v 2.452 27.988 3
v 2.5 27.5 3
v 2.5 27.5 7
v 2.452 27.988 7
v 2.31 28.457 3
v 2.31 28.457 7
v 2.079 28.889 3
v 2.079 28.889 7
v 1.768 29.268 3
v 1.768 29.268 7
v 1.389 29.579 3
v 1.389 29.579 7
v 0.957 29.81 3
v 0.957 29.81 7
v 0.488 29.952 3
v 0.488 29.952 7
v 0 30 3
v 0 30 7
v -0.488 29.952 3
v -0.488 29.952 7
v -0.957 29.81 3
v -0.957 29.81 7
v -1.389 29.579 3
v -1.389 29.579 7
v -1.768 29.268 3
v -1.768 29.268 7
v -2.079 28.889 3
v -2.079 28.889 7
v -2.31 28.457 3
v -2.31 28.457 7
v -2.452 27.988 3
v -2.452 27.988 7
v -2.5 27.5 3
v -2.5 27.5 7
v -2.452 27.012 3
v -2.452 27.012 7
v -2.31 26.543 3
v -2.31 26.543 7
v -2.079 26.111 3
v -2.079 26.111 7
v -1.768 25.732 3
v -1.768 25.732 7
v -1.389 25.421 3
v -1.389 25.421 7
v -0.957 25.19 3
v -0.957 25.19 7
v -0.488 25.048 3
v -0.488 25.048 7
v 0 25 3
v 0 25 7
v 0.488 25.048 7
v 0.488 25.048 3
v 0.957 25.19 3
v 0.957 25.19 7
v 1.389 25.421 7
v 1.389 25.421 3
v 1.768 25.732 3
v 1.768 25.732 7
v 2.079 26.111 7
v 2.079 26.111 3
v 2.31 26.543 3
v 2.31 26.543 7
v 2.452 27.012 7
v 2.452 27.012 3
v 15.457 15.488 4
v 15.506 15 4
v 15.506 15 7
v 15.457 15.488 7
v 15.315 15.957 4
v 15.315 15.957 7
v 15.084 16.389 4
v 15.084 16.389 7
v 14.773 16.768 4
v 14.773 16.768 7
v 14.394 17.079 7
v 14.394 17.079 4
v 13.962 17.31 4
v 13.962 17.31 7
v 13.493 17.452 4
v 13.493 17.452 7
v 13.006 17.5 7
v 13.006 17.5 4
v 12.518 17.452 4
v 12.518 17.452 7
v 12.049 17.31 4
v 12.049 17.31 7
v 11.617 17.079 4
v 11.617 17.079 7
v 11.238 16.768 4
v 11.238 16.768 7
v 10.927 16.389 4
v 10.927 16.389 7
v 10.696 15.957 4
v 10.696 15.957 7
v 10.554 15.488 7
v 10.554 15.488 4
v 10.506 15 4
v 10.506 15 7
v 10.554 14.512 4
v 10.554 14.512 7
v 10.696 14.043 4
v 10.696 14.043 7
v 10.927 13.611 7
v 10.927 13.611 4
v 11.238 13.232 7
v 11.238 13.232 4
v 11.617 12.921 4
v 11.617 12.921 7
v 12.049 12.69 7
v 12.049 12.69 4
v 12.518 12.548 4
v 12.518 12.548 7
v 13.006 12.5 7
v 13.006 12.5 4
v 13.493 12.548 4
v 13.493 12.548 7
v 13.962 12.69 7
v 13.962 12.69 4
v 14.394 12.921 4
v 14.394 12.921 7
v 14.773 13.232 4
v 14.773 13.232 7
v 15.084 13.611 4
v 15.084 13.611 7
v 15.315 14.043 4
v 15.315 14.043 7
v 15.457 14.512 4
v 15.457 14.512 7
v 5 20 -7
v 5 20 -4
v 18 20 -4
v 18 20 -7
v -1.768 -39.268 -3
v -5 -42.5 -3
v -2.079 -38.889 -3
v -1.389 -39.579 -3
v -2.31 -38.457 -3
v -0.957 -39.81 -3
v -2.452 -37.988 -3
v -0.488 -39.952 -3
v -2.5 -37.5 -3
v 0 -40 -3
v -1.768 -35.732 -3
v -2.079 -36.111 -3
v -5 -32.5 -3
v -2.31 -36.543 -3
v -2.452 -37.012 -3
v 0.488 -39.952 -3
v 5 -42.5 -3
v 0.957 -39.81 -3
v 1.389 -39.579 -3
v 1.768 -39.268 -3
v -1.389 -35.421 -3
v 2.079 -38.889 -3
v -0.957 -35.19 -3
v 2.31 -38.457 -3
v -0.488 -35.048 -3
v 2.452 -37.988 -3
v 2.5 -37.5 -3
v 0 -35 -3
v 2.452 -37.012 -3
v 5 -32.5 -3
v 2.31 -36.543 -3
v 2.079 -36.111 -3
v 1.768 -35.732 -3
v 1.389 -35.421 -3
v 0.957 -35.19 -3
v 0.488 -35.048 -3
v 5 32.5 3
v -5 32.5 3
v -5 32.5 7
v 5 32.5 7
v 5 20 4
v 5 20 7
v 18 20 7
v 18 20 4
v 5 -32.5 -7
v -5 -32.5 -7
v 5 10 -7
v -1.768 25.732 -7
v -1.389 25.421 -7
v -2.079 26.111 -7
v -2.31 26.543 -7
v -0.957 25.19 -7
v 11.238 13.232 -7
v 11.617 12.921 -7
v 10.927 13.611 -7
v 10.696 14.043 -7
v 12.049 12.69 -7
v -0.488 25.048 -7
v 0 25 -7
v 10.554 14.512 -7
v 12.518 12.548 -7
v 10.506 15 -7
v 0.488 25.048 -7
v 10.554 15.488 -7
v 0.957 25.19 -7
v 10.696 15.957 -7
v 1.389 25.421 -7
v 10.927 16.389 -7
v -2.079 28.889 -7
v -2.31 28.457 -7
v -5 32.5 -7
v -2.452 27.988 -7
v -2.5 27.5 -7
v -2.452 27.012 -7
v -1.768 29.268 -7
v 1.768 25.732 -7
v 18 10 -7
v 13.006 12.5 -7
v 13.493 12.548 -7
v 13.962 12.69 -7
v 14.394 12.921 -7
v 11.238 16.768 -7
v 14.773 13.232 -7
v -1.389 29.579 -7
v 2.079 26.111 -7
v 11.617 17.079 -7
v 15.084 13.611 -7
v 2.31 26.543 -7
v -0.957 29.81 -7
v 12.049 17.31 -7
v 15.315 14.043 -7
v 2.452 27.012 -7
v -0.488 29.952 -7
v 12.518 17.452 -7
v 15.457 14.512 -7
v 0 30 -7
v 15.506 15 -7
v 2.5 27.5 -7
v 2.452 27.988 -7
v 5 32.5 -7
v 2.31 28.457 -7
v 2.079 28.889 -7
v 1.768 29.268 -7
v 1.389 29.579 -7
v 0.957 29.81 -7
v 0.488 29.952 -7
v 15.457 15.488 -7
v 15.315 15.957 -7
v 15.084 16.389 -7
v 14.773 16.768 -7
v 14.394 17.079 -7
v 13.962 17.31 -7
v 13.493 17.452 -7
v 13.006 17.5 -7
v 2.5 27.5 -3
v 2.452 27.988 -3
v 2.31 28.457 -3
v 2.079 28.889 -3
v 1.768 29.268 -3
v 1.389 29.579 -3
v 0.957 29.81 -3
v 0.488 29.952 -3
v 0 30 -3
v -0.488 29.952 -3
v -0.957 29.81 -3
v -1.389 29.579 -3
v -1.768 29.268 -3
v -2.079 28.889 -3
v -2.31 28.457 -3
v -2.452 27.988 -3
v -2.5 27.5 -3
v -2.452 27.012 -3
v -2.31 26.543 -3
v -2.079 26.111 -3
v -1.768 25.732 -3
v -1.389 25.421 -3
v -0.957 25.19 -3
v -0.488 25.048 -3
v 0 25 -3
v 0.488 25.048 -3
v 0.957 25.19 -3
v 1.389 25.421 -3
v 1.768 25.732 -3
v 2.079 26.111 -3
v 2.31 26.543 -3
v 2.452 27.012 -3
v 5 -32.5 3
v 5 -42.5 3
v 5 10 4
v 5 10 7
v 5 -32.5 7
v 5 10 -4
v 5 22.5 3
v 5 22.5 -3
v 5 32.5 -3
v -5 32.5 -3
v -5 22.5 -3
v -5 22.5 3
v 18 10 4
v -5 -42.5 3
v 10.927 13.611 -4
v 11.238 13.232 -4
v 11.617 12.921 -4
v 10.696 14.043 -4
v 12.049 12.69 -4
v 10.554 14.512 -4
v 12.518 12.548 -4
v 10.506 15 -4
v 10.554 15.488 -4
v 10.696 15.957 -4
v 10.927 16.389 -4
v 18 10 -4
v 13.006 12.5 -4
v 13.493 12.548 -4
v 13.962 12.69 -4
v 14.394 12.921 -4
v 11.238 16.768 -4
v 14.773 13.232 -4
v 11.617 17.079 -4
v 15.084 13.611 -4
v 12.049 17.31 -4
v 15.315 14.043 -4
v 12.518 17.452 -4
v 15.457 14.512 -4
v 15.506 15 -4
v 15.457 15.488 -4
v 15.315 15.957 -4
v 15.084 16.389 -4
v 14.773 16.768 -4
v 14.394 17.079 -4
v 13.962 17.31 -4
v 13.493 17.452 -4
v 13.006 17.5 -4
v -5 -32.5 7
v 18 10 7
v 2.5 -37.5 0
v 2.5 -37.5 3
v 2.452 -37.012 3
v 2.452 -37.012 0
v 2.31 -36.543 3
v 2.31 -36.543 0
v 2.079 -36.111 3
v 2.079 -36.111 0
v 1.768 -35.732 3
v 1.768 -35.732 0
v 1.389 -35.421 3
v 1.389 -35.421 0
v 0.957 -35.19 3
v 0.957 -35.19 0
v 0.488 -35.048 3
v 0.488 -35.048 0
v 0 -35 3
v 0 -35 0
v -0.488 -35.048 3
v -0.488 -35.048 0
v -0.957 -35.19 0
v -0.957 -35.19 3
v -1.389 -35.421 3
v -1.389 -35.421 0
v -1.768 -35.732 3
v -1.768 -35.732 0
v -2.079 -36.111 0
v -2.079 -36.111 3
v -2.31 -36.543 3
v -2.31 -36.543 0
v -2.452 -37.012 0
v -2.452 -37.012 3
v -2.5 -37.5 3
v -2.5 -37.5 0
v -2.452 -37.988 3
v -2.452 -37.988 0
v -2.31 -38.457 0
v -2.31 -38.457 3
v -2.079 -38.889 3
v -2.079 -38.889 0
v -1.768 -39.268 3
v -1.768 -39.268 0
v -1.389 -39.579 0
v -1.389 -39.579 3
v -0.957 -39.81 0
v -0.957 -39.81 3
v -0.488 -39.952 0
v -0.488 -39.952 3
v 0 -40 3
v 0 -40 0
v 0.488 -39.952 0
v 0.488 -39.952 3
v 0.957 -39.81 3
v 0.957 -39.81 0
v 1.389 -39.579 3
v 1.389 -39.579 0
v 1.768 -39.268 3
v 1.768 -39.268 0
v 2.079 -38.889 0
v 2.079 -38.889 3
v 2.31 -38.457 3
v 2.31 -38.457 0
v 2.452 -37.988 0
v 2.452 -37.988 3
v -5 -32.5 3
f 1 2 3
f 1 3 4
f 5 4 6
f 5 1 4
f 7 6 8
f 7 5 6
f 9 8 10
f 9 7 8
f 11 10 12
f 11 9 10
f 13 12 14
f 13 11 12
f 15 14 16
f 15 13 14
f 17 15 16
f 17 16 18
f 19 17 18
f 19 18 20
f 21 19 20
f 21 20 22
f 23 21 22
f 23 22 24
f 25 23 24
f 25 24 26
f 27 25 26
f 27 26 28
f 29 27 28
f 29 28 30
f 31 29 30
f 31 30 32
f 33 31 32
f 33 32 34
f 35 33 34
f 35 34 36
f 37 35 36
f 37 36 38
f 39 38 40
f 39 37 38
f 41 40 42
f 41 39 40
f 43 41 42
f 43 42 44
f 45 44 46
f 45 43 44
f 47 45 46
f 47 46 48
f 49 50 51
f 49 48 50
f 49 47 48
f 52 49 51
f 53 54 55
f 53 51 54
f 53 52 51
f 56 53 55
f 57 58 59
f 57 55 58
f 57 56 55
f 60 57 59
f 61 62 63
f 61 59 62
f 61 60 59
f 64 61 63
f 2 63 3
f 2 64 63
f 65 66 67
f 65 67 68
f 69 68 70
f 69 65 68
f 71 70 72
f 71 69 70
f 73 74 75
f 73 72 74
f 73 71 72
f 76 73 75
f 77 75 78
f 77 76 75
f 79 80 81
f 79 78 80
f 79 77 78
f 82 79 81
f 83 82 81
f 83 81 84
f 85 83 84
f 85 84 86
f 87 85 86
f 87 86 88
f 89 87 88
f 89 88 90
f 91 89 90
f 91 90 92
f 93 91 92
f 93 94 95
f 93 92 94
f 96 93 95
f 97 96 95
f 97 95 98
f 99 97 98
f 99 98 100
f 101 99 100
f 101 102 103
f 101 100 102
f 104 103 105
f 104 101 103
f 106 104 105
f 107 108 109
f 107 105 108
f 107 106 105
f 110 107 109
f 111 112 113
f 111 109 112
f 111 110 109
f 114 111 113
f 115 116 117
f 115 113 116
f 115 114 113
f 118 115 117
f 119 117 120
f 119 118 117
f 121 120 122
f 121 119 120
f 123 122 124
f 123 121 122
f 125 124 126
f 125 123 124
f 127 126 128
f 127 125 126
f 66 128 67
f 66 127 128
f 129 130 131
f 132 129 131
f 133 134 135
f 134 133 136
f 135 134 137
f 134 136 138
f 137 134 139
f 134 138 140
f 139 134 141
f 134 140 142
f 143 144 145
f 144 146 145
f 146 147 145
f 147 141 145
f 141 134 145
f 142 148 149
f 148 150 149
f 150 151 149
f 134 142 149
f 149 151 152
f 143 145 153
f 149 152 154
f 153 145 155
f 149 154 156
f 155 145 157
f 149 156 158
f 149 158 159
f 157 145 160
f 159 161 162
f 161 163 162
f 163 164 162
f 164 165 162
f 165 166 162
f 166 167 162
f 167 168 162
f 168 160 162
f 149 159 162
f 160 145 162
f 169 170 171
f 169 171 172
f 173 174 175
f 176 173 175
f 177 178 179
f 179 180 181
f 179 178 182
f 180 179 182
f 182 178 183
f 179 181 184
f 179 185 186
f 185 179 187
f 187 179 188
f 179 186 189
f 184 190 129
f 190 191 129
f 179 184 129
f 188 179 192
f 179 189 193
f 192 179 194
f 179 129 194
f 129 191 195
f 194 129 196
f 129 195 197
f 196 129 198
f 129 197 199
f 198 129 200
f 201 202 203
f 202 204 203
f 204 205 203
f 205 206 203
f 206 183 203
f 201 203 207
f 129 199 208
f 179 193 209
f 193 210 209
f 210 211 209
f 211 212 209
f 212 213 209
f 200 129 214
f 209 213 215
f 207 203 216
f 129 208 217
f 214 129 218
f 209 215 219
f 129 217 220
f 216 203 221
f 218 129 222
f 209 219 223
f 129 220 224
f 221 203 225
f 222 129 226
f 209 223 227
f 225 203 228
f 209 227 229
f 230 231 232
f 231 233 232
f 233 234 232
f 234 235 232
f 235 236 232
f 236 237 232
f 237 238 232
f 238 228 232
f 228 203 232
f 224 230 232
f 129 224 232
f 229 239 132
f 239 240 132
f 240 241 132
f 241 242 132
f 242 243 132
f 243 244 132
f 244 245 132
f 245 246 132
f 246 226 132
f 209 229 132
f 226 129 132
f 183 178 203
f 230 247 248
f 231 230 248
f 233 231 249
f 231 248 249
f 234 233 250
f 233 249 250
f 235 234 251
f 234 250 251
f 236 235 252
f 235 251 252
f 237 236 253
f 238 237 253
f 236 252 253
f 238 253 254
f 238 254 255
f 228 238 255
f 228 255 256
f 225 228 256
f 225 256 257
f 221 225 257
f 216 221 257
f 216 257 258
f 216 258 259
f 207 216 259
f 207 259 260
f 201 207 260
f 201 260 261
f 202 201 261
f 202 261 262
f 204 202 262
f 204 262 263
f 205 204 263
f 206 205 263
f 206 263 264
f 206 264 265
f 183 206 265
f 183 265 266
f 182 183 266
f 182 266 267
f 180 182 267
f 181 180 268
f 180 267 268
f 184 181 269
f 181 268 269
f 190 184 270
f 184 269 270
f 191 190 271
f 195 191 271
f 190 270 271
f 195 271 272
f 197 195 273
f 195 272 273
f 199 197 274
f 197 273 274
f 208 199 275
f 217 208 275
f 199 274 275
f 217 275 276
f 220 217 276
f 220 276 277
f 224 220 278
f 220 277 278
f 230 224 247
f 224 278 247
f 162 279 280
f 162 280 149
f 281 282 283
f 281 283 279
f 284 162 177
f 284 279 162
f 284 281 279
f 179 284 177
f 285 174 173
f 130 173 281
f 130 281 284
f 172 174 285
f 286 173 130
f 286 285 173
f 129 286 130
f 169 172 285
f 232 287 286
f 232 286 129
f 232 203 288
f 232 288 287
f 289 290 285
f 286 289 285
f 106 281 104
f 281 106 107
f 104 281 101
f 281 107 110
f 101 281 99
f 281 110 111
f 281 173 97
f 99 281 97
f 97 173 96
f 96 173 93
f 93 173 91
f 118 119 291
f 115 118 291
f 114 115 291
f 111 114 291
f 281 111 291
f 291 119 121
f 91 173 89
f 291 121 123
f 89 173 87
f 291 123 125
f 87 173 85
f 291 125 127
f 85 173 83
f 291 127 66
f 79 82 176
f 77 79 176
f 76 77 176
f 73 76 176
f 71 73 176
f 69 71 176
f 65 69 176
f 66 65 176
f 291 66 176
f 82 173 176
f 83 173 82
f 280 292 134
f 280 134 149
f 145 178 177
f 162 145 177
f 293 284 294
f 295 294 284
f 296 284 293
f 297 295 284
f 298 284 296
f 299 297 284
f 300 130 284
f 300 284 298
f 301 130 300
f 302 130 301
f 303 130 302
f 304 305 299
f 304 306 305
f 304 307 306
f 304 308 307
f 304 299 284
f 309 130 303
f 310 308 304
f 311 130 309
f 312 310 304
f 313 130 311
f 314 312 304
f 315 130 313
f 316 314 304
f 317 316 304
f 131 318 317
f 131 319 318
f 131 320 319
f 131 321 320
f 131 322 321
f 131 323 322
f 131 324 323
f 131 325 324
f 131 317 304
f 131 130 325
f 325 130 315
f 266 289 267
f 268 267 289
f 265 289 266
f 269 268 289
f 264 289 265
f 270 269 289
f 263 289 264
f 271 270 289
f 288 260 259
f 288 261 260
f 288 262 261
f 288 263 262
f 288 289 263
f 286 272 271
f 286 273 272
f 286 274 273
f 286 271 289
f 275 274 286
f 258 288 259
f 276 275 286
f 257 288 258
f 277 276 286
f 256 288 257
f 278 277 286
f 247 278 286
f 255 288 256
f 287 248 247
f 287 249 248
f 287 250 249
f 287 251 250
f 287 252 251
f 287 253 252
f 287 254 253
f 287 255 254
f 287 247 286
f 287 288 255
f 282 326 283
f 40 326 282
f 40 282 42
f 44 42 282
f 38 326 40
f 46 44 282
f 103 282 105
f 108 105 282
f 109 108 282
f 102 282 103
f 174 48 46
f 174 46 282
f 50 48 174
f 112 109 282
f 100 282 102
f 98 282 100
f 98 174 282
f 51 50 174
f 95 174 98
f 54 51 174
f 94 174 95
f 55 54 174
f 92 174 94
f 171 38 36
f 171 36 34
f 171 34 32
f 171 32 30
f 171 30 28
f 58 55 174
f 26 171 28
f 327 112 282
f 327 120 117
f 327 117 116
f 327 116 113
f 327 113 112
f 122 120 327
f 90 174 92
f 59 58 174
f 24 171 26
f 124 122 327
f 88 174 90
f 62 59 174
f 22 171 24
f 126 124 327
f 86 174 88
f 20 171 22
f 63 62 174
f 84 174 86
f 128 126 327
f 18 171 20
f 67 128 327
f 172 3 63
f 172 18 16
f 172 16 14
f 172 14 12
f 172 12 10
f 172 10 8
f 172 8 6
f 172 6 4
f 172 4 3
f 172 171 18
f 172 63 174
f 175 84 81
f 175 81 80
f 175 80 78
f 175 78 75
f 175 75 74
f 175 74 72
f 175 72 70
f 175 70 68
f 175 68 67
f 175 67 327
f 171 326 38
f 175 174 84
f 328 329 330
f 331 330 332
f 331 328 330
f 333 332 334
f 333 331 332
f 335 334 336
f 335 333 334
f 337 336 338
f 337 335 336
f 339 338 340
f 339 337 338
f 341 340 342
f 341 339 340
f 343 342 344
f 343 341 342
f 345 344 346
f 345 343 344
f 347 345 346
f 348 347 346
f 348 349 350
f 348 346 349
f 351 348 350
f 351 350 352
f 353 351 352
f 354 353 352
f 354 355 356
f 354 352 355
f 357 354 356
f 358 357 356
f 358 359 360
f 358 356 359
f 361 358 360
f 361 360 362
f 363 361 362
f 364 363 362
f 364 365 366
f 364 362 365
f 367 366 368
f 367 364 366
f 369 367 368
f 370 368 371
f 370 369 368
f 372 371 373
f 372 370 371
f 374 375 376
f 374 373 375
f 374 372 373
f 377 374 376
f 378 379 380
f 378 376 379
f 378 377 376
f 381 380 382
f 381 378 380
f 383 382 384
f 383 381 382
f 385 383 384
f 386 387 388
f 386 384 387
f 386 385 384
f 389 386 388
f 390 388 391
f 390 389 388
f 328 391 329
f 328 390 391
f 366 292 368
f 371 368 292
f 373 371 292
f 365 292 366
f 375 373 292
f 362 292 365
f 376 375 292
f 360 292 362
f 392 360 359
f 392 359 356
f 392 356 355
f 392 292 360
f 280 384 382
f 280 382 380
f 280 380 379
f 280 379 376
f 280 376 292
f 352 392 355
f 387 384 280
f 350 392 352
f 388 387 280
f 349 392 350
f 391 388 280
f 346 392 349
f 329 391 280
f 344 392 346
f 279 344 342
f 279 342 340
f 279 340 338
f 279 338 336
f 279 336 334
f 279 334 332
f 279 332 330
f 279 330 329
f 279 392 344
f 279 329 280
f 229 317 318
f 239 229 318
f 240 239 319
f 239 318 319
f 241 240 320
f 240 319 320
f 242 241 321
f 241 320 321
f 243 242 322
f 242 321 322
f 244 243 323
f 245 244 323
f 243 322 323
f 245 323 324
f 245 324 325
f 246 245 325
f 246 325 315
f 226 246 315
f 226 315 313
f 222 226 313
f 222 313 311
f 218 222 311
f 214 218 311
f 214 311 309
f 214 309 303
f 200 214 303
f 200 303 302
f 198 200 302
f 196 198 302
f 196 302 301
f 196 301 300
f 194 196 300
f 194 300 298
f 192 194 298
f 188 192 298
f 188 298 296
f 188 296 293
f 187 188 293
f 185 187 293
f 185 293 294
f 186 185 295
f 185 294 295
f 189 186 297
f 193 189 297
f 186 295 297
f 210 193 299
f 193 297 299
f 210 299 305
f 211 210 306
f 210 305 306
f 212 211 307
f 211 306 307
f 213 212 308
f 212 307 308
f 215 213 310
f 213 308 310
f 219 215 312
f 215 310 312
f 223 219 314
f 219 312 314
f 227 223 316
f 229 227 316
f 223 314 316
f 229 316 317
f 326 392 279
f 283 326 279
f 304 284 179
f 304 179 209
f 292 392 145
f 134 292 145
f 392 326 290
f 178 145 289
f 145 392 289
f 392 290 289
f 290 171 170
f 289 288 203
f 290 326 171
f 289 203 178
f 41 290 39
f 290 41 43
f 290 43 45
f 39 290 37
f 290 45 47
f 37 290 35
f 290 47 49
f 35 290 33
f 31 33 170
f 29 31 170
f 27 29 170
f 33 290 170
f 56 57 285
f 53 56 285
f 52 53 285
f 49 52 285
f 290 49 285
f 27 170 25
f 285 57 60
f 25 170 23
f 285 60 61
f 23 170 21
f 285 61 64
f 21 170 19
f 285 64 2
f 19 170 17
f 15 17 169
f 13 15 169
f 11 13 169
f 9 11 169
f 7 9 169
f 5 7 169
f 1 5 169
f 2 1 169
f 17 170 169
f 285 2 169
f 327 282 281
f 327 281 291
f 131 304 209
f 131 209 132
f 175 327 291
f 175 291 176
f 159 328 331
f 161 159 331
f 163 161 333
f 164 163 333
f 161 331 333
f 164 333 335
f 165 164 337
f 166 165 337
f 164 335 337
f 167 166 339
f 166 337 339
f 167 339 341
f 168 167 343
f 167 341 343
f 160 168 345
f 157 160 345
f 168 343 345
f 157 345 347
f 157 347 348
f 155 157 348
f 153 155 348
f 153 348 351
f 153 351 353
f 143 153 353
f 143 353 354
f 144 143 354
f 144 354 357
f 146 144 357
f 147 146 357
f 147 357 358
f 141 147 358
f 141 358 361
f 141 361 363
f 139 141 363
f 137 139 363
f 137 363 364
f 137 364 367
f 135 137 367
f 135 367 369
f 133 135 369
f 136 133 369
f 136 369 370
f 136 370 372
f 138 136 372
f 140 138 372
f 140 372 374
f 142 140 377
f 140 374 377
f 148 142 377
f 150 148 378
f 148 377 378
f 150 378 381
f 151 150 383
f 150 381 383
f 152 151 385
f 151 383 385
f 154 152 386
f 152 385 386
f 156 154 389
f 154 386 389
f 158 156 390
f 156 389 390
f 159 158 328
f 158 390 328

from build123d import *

# Parameters (mm, degrees)
SKETCH_1_W                = 10
SKETCH_1_H                = 14
EXTRUDE_1_DEPTH           = 32.5
SKETCH_7_W                = 13
SKETCH_7_H                = 10
EXTRUDE_3_DEPTH           = 7
SKETCH_8_W                = 13
SKETCH_8_H                = 10
CUT_EXTRUDE_3_DEPTH       = 4
SKETCH_10_R               = 2.5
CUT_EXTRUDE_4_DEPTH       = 8
CUT_EXTRUDE_4_DEPTH_BACK  = 8
SKETCH_14_W               = 10
SKETCH_14_H               = 10
CUT_EXTRUDE_8_DEPTH       = 3
SKETCH_15_W               = 10
SKETCH_15_H               = 10
EXTRUDE_4_DEPTH           = 3
SKETCH_16_R               = 2.5
CUT_EXTRUDE_9_DEPTH       = 8
CUT_EXTRUDE_9_DEPTH_BACK  = 8
SKETCH_17_R               = 2.5
CUT_EXTRUDE_10_DEPTH      = 8
CUT_EXTRUDE_10_DEPTH_BACK = 8


with BuildPart() as part:
    # 草图1 → 凸台-拉伸1 (new body, symmetric)
    with BuildSketch(Plane(origin=(0, 0, 0), x_dir=(1, 0, 0), z_dir=(0, 1, 0))):
        Rectangle(SKETCH_1_W, SKETCH_1_H)
    extrude(amount=EXTRUDE_1_DEPTH, both=True)

    # 草图7 → 凸台-拉伸3 (add, symmetric)
    with BuildSketch(Plane.XY):
        with Locations((11.5, 15)):
            Rectangle(SKETCH_7_W, SKETCH_7_H)
    extrude(amount=EXTRUDE_3_DEPTH, both=True)

    # 草图8 → 切除-拉伸3 (cut, symmetric)
    with BuildSketch(Plane.XY):
        with Locations((11.5, 15)):
            Rectangle(SKETCH_8_W, SKETCH_8_H)
    extrude(amount=CUT_EXTRUDE_3_DEPTH, both=True, mode=Mode.SUBTRACT)

    # 草图10 → 切除-拉伸4 (cut, two sides)
    with BuildSketch(Plane.XY) as cut_extrude_4_sk:
        with Locations((13.005535268, 15)):
            Circle(SKETCH_10_R)
    extrude(amount=CUT_EXTRUDE_4_DEPTH, mode=Mode.SUBTRACT)
    extrude(cut_extrude_4_sk.sketch, amount=-CUT_EXTRUDE_4_DEPTH_BACK, mode=Mode.SUBTRACT)

    # 草图14 → 切除-拉伸8 (cut, symmetric)
    with BuildSketch(Plane.XY):
        with Locations((0, 27.5)):
            Rectangle(SKETCH_14_W, SKETCH_14_H)
    extrude(amount=CUT_EXTRUDE_8_DEPTH, both=True, mode=Mode.SUBTRACT)

    # 草图15 → 凸台-拉伸4 (add, symmetric)
    with BuildSketch(Plane.XY):
        with Locations((0, -37.5)):
            Rectangle(SKETCH_15_W, SKETCH_15_H)
    extrude(amount=EXTRUDE_4_DEPTH, both=True)

    # 草图16 → 切除-拉伸9 (cut, two sides)
    with BuildSketch(Plane.XY) as cut_extrude_9_sk:
        with Locations((0, 27.5)):
            Circle(SKETCH_16_R)
    extrude(amount=CUT_EXTRUDE_9_DEPTH, mode=Mode.SUBTRACT)
    extrude(cut_extrude_9_sk.sketch, amount=-CUT_EXTRUDE_9_DEPTH_BACK, mode=Mode.SUBTRACT)

    # 草图17 → 切除-拉伸10 (cut, two sides)
    with BuildSketch(Plane.XY) as cut_extrude_10_sk:
        with Locations((0, -37.5)):
            Circle(SKETCH_17_R)
    extrude(amount=CUT_EXTRUDE_10_DEPTH, mode=Mode.SUBTRACT)
    extrude(cut_extrude_10_sk.sketch, amount=-CUT_EXTRUDE_10_DEPTH_BACK, mode=Mode.SUBTRACT)


solid = part.part
